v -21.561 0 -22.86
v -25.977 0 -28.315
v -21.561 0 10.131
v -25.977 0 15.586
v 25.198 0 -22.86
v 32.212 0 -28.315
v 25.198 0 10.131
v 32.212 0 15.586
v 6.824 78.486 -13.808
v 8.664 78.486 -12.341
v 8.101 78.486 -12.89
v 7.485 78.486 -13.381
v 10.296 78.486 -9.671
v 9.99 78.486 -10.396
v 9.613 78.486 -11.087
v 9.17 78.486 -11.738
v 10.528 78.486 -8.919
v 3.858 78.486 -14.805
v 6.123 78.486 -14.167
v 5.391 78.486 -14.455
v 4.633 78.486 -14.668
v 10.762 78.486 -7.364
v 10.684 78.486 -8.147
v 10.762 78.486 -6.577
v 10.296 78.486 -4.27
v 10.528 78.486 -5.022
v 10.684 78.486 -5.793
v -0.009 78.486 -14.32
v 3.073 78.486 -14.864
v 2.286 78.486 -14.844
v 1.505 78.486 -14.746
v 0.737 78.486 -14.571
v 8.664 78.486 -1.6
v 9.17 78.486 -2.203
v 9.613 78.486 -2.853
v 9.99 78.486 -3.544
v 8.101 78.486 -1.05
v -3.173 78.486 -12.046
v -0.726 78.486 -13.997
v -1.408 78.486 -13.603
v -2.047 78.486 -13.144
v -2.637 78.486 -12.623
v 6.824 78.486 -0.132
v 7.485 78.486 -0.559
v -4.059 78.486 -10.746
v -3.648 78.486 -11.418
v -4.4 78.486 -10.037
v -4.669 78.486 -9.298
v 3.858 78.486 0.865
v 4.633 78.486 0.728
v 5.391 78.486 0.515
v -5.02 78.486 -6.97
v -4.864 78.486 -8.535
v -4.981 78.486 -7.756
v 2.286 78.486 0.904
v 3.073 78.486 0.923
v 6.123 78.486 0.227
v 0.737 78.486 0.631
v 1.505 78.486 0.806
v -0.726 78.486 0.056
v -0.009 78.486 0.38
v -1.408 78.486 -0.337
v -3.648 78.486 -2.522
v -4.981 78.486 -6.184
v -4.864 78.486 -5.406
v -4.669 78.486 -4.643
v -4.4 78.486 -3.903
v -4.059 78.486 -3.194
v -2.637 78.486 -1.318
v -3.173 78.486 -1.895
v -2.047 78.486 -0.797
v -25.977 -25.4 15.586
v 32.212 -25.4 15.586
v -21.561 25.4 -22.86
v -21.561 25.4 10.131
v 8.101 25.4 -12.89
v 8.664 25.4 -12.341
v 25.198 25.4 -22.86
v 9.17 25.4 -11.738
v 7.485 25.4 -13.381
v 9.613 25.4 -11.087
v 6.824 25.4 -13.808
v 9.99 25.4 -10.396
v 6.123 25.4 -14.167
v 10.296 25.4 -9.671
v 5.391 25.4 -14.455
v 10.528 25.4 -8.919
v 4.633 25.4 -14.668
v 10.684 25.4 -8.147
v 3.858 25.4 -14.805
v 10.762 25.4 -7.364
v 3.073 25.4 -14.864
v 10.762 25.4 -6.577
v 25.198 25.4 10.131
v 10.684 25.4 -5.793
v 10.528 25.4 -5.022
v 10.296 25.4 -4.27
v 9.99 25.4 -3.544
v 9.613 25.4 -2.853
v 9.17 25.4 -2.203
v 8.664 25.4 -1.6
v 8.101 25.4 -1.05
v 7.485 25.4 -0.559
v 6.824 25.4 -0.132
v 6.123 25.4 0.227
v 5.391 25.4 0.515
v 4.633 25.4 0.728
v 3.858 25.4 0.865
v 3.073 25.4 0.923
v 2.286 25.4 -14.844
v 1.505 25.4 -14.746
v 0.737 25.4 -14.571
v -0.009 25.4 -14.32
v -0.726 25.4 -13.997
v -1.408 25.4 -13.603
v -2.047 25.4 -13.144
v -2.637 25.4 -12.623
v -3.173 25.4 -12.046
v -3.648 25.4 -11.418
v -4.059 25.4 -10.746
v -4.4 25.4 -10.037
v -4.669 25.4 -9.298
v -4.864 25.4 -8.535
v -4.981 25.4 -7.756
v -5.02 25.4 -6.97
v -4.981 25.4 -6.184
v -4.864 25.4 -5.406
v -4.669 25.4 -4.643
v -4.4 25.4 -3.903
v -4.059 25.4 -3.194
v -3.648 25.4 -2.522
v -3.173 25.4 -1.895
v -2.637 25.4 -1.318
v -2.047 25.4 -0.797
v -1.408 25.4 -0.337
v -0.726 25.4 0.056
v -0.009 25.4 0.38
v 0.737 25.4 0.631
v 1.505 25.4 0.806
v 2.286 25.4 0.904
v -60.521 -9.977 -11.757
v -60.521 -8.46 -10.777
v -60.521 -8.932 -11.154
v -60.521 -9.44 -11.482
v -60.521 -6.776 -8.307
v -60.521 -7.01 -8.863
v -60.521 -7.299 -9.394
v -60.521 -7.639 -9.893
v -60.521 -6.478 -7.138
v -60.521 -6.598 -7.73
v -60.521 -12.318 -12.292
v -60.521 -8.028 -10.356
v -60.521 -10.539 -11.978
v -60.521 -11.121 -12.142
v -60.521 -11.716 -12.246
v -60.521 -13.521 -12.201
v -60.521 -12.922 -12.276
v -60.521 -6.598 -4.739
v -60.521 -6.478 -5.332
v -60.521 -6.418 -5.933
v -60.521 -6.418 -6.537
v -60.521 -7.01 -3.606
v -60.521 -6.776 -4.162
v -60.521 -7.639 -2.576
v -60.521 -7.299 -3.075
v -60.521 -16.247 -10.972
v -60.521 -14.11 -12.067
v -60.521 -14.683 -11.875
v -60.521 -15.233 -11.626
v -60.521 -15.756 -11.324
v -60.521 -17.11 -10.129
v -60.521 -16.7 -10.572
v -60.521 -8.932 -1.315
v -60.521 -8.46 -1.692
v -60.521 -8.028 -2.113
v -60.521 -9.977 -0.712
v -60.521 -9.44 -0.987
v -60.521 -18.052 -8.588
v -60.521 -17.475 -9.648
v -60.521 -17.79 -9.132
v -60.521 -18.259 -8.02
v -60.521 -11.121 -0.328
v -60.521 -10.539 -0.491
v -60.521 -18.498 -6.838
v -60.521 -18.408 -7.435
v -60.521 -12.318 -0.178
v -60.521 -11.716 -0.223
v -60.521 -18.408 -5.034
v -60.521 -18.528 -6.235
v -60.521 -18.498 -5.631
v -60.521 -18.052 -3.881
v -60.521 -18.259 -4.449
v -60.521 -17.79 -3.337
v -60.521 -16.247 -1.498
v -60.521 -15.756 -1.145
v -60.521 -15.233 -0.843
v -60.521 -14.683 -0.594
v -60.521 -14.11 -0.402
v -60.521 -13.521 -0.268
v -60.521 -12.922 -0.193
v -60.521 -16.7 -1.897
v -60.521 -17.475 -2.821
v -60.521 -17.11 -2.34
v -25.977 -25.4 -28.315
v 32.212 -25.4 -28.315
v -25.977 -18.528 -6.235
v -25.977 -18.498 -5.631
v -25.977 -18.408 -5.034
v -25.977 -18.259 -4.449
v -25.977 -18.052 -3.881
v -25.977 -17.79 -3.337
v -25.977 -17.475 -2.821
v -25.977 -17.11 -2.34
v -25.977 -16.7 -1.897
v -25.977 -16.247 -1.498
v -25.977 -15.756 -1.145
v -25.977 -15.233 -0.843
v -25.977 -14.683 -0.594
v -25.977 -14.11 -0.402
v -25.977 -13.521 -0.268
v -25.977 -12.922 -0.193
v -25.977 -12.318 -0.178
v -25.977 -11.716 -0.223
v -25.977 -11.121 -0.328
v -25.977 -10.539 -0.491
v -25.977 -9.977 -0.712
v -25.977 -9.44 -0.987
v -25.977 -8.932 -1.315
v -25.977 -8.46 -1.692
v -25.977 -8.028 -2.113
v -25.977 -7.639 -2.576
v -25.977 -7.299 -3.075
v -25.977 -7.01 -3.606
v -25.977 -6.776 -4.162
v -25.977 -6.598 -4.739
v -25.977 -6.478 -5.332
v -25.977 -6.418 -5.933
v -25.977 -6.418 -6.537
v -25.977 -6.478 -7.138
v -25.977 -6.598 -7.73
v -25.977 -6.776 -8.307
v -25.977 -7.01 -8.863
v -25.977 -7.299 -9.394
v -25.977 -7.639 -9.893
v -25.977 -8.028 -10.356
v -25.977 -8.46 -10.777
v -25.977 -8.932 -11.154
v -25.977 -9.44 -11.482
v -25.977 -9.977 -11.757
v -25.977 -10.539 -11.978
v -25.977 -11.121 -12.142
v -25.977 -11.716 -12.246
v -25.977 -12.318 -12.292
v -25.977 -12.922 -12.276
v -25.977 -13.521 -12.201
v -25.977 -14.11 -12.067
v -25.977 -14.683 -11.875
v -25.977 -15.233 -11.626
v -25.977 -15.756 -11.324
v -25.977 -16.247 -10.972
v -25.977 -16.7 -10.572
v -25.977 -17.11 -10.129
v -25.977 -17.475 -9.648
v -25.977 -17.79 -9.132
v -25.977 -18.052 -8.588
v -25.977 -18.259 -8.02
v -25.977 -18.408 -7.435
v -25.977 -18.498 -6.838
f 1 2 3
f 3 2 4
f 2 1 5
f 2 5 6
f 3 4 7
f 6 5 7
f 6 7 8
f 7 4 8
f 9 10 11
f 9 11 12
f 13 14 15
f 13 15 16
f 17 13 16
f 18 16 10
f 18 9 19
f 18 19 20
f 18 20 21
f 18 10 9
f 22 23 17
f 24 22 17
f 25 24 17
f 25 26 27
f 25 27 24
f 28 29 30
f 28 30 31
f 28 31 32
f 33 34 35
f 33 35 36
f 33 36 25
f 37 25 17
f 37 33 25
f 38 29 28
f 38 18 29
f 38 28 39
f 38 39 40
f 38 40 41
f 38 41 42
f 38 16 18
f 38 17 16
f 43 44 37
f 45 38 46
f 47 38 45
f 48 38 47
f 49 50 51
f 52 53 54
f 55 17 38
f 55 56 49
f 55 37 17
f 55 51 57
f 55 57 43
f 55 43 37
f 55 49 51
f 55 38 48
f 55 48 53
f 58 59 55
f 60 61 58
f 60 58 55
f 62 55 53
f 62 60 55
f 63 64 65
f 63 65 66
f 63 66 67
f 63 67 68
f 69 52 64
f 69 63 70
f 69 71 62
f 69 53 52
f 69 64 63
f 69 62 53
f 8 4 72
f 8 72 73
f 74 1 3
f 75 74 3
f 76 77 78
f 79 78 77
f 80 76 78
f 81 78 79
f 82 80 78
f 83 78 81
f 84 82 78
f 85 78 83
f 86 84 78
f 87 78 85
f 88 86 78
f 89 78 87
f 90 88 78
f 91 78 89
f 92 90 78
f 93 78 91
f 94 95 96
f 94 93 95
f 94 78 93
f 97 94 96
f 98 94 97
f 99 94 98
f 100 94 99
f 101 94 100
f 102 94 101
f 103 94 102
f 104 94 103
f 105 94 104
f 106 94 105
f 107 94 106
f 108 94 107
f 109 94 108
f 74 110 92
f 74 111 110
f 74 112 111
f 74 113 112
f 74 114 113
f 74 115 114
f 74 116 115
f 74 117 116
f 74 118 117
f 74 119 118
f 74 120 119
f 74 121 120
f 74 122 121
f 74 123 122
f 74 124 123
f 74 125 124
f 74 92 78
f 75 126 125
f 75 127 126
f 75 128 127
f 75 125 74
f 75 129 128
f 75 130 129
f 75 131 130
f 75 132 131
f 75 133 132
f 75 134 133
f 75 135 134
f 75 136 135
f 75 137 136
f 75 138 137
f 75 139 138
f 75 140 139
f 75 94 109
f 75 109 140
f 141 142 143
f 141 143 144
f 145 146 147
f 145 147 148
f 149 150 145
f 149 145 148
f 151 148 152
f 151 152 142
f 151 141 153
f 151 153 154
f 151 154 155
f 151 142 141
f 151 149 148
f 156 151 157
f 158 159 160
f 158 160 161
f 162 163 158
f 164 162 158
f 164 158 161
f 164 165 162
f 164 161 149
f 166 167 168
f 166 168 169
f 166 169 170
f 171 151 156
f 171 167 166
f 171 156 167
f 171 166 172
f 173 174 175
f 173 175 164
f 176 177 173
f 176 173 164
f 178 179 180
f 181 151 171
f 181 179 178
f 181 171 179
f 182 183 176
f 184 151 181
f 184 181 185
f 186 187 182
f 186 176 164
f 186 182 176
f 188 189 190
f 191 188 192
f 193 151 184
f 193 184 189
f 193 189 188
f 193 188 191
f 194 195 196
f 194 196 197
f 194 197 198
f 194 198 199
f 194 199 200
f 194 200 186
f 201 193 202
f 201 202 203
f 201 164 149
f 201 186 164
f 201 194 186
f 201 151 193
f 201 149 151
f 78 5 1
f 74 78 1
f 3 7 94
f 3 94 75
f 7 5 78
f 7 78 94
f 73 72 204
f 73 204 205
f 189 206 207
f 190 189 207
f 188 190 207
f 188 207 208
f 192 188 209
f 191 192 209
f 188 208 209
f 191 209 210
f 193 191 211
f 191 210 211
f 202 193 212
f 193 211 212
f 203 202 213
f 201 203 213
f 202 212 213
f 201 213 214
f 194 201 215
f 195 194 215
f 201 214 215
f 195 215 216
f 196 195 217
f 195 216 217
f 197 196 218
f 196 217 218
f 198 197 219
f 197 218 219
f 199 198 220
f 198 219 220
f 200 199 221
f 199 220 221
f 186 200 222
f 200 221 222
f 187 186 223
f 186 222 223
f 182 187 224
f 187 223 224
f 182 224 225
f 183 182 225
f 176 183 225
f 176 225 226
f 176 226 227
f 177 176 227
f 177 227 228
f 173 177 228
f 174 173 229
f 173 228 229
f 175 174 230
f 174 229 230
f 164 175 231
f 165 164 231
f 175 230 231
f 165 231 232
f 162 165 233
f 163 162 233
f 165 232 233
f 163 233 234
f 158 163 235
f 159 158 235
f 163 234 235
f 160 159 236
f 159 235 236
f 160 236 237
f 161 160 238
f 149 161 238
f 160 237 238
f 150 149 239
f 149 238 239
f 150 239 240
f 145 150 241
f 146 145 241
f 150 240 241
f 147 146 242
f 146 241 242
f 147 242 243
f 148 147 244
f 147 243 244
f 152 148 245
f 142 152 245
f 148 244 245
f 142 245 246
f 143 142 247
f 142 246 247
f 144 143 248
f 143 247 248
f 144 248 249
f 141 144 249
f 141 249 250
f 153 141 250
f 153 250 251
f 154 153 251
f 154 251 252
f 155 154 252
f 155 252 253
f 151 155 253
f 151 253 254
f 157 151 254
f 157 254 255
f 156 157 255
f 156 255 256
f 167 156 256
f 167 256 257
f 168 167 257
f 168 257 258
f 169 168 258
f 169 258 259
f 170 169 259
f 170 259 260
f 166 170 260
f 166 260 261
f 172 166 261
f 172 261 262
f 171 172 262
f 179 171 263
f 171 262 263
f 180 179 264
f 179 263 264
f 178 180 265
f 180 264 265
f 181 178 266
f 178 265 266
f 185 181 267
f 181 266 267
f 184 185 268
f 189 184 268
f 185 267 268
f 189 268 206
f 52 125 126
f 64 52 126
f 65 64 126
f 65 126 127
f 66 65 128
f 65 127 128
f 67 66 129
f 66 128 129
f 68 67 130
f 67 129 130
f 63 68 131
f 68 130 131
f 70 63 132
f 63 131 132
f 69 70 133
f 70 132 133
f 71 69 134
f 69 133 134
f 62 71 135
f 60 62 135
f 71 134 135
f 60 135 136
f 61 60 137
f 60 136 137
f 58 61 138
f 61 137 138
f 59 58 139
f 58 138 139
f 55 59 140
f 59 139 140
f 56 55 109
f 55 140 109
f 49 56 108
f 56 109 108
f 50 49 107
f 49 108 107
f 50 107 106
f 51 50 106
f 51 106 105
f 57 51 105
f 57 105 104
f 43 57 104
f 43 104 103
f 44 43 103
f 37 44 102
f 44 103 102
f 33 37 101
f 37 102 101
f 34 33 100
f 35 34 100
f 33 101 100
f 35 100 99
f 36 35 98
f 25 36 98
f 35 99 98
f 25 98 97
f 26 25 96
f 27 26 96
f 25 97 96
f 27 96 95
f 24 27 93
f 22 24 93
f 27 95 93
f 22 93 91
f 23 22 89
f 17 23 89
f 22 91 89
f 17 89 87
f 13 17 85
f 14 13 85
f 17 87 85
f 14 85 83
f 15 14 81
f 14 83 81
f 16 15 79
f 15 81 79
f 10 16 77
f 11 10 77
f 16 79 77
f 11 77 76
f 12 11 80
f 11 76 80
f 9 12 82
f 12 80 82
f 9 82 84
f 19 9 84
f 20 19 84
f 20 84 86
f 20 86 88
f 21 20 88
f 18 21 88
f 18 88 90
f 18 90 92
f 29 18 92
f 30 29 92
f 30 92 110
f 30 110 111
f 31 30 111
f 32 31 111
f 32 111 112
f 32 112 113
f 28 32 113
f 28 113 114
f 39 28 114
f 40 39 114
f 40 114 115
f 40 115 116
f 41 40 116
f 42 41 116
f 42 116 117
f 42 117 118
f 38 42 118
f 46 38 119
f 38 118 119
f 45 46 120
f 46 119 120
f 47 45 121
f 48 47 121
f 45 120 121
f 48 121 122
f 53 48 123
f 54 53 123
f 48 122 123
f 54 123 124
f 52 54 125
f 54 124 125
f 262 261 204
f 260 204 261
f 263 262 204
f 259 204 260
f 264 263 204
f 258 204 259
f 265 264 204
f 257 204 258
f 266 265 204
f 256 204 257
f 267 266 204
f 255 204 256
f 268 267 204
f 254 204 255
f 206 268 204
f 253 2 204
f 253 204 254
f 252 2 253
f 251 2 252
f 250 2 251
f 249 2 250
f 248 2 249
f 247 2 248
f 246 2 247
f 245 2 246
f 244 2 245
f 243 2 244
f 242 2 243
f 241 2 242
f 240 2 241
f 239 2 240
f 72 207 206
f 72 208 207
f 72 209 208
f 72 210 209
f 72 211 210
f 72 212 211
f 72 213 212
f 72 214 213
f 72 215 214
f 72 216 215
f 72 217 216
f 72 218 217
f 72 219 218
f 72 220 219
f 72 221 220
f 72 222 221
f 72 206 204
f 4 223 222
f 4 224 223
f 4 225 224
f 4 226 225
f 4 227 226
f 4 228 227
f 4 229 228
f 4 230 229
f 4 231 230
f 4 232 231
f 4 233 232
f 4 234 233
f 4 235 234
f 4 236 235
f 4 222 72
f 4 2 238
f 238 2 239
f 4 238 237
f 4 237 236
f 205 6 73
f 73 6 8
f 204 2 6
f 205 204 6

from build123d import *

# Parameters (mm, degrees)
F0_W     = 58.1890903413
F0_H     = 43.9015906304
F1_DEPTH = 25.4
F2_R     = 6.0588899817
F3_DEPTH = 34.544
F4_W     = 46.7590875924
F4_H     = 32.9911382869
F5_DEPTH = 25.4
F6_R     = 7.896006859
F7_DEPTH = 53.086


with BuildPart() as f1:
    # F0 (on Front) → F1 (new body)
    with BuildSketch(Plane.XZ):
        with Locations((3.1172726303, -6.3644321635)):
            Rectangle(F0_W, F0_H)
    extrude(amount=F1_DEPTH)

    # F2 (on face) → F3 (join)
    with BuildSketch(Plane(origin=(-25.9772725403, 0, 0), x_dir=(0, -1, 0), z_dir=(-1, 0, 0))):
        with Locations((12.4690905213, -6.2345452607)):
            Circle(F2_R)
    extrude(amount=F3_DEPTH)

    # F4 (on face) → F5 (join)
    with BuildSketch(Plane(origin=(0, 0, 0), x_dir=(-1, 0, 0), z_dir=(0, 1, 0))):
        with Locations((-1.8184091896, -6.3644326292)):
            Rectangle(F4_W, F4_H)
    extrude(amount=F5_DEPTH)

    # F6 (on face) → F7 (join)
    with BuildSketch(Plane(origin=(0, 25.4, 0), x_dir=(-1, 0, 0), z_dir=(0, 1, 0))):
        with Locations((-2.8758263215, -6.9701997563)):
            Circle(F6_R)
    extrude(amount=F7_DEPTH)


solid = f1.part
